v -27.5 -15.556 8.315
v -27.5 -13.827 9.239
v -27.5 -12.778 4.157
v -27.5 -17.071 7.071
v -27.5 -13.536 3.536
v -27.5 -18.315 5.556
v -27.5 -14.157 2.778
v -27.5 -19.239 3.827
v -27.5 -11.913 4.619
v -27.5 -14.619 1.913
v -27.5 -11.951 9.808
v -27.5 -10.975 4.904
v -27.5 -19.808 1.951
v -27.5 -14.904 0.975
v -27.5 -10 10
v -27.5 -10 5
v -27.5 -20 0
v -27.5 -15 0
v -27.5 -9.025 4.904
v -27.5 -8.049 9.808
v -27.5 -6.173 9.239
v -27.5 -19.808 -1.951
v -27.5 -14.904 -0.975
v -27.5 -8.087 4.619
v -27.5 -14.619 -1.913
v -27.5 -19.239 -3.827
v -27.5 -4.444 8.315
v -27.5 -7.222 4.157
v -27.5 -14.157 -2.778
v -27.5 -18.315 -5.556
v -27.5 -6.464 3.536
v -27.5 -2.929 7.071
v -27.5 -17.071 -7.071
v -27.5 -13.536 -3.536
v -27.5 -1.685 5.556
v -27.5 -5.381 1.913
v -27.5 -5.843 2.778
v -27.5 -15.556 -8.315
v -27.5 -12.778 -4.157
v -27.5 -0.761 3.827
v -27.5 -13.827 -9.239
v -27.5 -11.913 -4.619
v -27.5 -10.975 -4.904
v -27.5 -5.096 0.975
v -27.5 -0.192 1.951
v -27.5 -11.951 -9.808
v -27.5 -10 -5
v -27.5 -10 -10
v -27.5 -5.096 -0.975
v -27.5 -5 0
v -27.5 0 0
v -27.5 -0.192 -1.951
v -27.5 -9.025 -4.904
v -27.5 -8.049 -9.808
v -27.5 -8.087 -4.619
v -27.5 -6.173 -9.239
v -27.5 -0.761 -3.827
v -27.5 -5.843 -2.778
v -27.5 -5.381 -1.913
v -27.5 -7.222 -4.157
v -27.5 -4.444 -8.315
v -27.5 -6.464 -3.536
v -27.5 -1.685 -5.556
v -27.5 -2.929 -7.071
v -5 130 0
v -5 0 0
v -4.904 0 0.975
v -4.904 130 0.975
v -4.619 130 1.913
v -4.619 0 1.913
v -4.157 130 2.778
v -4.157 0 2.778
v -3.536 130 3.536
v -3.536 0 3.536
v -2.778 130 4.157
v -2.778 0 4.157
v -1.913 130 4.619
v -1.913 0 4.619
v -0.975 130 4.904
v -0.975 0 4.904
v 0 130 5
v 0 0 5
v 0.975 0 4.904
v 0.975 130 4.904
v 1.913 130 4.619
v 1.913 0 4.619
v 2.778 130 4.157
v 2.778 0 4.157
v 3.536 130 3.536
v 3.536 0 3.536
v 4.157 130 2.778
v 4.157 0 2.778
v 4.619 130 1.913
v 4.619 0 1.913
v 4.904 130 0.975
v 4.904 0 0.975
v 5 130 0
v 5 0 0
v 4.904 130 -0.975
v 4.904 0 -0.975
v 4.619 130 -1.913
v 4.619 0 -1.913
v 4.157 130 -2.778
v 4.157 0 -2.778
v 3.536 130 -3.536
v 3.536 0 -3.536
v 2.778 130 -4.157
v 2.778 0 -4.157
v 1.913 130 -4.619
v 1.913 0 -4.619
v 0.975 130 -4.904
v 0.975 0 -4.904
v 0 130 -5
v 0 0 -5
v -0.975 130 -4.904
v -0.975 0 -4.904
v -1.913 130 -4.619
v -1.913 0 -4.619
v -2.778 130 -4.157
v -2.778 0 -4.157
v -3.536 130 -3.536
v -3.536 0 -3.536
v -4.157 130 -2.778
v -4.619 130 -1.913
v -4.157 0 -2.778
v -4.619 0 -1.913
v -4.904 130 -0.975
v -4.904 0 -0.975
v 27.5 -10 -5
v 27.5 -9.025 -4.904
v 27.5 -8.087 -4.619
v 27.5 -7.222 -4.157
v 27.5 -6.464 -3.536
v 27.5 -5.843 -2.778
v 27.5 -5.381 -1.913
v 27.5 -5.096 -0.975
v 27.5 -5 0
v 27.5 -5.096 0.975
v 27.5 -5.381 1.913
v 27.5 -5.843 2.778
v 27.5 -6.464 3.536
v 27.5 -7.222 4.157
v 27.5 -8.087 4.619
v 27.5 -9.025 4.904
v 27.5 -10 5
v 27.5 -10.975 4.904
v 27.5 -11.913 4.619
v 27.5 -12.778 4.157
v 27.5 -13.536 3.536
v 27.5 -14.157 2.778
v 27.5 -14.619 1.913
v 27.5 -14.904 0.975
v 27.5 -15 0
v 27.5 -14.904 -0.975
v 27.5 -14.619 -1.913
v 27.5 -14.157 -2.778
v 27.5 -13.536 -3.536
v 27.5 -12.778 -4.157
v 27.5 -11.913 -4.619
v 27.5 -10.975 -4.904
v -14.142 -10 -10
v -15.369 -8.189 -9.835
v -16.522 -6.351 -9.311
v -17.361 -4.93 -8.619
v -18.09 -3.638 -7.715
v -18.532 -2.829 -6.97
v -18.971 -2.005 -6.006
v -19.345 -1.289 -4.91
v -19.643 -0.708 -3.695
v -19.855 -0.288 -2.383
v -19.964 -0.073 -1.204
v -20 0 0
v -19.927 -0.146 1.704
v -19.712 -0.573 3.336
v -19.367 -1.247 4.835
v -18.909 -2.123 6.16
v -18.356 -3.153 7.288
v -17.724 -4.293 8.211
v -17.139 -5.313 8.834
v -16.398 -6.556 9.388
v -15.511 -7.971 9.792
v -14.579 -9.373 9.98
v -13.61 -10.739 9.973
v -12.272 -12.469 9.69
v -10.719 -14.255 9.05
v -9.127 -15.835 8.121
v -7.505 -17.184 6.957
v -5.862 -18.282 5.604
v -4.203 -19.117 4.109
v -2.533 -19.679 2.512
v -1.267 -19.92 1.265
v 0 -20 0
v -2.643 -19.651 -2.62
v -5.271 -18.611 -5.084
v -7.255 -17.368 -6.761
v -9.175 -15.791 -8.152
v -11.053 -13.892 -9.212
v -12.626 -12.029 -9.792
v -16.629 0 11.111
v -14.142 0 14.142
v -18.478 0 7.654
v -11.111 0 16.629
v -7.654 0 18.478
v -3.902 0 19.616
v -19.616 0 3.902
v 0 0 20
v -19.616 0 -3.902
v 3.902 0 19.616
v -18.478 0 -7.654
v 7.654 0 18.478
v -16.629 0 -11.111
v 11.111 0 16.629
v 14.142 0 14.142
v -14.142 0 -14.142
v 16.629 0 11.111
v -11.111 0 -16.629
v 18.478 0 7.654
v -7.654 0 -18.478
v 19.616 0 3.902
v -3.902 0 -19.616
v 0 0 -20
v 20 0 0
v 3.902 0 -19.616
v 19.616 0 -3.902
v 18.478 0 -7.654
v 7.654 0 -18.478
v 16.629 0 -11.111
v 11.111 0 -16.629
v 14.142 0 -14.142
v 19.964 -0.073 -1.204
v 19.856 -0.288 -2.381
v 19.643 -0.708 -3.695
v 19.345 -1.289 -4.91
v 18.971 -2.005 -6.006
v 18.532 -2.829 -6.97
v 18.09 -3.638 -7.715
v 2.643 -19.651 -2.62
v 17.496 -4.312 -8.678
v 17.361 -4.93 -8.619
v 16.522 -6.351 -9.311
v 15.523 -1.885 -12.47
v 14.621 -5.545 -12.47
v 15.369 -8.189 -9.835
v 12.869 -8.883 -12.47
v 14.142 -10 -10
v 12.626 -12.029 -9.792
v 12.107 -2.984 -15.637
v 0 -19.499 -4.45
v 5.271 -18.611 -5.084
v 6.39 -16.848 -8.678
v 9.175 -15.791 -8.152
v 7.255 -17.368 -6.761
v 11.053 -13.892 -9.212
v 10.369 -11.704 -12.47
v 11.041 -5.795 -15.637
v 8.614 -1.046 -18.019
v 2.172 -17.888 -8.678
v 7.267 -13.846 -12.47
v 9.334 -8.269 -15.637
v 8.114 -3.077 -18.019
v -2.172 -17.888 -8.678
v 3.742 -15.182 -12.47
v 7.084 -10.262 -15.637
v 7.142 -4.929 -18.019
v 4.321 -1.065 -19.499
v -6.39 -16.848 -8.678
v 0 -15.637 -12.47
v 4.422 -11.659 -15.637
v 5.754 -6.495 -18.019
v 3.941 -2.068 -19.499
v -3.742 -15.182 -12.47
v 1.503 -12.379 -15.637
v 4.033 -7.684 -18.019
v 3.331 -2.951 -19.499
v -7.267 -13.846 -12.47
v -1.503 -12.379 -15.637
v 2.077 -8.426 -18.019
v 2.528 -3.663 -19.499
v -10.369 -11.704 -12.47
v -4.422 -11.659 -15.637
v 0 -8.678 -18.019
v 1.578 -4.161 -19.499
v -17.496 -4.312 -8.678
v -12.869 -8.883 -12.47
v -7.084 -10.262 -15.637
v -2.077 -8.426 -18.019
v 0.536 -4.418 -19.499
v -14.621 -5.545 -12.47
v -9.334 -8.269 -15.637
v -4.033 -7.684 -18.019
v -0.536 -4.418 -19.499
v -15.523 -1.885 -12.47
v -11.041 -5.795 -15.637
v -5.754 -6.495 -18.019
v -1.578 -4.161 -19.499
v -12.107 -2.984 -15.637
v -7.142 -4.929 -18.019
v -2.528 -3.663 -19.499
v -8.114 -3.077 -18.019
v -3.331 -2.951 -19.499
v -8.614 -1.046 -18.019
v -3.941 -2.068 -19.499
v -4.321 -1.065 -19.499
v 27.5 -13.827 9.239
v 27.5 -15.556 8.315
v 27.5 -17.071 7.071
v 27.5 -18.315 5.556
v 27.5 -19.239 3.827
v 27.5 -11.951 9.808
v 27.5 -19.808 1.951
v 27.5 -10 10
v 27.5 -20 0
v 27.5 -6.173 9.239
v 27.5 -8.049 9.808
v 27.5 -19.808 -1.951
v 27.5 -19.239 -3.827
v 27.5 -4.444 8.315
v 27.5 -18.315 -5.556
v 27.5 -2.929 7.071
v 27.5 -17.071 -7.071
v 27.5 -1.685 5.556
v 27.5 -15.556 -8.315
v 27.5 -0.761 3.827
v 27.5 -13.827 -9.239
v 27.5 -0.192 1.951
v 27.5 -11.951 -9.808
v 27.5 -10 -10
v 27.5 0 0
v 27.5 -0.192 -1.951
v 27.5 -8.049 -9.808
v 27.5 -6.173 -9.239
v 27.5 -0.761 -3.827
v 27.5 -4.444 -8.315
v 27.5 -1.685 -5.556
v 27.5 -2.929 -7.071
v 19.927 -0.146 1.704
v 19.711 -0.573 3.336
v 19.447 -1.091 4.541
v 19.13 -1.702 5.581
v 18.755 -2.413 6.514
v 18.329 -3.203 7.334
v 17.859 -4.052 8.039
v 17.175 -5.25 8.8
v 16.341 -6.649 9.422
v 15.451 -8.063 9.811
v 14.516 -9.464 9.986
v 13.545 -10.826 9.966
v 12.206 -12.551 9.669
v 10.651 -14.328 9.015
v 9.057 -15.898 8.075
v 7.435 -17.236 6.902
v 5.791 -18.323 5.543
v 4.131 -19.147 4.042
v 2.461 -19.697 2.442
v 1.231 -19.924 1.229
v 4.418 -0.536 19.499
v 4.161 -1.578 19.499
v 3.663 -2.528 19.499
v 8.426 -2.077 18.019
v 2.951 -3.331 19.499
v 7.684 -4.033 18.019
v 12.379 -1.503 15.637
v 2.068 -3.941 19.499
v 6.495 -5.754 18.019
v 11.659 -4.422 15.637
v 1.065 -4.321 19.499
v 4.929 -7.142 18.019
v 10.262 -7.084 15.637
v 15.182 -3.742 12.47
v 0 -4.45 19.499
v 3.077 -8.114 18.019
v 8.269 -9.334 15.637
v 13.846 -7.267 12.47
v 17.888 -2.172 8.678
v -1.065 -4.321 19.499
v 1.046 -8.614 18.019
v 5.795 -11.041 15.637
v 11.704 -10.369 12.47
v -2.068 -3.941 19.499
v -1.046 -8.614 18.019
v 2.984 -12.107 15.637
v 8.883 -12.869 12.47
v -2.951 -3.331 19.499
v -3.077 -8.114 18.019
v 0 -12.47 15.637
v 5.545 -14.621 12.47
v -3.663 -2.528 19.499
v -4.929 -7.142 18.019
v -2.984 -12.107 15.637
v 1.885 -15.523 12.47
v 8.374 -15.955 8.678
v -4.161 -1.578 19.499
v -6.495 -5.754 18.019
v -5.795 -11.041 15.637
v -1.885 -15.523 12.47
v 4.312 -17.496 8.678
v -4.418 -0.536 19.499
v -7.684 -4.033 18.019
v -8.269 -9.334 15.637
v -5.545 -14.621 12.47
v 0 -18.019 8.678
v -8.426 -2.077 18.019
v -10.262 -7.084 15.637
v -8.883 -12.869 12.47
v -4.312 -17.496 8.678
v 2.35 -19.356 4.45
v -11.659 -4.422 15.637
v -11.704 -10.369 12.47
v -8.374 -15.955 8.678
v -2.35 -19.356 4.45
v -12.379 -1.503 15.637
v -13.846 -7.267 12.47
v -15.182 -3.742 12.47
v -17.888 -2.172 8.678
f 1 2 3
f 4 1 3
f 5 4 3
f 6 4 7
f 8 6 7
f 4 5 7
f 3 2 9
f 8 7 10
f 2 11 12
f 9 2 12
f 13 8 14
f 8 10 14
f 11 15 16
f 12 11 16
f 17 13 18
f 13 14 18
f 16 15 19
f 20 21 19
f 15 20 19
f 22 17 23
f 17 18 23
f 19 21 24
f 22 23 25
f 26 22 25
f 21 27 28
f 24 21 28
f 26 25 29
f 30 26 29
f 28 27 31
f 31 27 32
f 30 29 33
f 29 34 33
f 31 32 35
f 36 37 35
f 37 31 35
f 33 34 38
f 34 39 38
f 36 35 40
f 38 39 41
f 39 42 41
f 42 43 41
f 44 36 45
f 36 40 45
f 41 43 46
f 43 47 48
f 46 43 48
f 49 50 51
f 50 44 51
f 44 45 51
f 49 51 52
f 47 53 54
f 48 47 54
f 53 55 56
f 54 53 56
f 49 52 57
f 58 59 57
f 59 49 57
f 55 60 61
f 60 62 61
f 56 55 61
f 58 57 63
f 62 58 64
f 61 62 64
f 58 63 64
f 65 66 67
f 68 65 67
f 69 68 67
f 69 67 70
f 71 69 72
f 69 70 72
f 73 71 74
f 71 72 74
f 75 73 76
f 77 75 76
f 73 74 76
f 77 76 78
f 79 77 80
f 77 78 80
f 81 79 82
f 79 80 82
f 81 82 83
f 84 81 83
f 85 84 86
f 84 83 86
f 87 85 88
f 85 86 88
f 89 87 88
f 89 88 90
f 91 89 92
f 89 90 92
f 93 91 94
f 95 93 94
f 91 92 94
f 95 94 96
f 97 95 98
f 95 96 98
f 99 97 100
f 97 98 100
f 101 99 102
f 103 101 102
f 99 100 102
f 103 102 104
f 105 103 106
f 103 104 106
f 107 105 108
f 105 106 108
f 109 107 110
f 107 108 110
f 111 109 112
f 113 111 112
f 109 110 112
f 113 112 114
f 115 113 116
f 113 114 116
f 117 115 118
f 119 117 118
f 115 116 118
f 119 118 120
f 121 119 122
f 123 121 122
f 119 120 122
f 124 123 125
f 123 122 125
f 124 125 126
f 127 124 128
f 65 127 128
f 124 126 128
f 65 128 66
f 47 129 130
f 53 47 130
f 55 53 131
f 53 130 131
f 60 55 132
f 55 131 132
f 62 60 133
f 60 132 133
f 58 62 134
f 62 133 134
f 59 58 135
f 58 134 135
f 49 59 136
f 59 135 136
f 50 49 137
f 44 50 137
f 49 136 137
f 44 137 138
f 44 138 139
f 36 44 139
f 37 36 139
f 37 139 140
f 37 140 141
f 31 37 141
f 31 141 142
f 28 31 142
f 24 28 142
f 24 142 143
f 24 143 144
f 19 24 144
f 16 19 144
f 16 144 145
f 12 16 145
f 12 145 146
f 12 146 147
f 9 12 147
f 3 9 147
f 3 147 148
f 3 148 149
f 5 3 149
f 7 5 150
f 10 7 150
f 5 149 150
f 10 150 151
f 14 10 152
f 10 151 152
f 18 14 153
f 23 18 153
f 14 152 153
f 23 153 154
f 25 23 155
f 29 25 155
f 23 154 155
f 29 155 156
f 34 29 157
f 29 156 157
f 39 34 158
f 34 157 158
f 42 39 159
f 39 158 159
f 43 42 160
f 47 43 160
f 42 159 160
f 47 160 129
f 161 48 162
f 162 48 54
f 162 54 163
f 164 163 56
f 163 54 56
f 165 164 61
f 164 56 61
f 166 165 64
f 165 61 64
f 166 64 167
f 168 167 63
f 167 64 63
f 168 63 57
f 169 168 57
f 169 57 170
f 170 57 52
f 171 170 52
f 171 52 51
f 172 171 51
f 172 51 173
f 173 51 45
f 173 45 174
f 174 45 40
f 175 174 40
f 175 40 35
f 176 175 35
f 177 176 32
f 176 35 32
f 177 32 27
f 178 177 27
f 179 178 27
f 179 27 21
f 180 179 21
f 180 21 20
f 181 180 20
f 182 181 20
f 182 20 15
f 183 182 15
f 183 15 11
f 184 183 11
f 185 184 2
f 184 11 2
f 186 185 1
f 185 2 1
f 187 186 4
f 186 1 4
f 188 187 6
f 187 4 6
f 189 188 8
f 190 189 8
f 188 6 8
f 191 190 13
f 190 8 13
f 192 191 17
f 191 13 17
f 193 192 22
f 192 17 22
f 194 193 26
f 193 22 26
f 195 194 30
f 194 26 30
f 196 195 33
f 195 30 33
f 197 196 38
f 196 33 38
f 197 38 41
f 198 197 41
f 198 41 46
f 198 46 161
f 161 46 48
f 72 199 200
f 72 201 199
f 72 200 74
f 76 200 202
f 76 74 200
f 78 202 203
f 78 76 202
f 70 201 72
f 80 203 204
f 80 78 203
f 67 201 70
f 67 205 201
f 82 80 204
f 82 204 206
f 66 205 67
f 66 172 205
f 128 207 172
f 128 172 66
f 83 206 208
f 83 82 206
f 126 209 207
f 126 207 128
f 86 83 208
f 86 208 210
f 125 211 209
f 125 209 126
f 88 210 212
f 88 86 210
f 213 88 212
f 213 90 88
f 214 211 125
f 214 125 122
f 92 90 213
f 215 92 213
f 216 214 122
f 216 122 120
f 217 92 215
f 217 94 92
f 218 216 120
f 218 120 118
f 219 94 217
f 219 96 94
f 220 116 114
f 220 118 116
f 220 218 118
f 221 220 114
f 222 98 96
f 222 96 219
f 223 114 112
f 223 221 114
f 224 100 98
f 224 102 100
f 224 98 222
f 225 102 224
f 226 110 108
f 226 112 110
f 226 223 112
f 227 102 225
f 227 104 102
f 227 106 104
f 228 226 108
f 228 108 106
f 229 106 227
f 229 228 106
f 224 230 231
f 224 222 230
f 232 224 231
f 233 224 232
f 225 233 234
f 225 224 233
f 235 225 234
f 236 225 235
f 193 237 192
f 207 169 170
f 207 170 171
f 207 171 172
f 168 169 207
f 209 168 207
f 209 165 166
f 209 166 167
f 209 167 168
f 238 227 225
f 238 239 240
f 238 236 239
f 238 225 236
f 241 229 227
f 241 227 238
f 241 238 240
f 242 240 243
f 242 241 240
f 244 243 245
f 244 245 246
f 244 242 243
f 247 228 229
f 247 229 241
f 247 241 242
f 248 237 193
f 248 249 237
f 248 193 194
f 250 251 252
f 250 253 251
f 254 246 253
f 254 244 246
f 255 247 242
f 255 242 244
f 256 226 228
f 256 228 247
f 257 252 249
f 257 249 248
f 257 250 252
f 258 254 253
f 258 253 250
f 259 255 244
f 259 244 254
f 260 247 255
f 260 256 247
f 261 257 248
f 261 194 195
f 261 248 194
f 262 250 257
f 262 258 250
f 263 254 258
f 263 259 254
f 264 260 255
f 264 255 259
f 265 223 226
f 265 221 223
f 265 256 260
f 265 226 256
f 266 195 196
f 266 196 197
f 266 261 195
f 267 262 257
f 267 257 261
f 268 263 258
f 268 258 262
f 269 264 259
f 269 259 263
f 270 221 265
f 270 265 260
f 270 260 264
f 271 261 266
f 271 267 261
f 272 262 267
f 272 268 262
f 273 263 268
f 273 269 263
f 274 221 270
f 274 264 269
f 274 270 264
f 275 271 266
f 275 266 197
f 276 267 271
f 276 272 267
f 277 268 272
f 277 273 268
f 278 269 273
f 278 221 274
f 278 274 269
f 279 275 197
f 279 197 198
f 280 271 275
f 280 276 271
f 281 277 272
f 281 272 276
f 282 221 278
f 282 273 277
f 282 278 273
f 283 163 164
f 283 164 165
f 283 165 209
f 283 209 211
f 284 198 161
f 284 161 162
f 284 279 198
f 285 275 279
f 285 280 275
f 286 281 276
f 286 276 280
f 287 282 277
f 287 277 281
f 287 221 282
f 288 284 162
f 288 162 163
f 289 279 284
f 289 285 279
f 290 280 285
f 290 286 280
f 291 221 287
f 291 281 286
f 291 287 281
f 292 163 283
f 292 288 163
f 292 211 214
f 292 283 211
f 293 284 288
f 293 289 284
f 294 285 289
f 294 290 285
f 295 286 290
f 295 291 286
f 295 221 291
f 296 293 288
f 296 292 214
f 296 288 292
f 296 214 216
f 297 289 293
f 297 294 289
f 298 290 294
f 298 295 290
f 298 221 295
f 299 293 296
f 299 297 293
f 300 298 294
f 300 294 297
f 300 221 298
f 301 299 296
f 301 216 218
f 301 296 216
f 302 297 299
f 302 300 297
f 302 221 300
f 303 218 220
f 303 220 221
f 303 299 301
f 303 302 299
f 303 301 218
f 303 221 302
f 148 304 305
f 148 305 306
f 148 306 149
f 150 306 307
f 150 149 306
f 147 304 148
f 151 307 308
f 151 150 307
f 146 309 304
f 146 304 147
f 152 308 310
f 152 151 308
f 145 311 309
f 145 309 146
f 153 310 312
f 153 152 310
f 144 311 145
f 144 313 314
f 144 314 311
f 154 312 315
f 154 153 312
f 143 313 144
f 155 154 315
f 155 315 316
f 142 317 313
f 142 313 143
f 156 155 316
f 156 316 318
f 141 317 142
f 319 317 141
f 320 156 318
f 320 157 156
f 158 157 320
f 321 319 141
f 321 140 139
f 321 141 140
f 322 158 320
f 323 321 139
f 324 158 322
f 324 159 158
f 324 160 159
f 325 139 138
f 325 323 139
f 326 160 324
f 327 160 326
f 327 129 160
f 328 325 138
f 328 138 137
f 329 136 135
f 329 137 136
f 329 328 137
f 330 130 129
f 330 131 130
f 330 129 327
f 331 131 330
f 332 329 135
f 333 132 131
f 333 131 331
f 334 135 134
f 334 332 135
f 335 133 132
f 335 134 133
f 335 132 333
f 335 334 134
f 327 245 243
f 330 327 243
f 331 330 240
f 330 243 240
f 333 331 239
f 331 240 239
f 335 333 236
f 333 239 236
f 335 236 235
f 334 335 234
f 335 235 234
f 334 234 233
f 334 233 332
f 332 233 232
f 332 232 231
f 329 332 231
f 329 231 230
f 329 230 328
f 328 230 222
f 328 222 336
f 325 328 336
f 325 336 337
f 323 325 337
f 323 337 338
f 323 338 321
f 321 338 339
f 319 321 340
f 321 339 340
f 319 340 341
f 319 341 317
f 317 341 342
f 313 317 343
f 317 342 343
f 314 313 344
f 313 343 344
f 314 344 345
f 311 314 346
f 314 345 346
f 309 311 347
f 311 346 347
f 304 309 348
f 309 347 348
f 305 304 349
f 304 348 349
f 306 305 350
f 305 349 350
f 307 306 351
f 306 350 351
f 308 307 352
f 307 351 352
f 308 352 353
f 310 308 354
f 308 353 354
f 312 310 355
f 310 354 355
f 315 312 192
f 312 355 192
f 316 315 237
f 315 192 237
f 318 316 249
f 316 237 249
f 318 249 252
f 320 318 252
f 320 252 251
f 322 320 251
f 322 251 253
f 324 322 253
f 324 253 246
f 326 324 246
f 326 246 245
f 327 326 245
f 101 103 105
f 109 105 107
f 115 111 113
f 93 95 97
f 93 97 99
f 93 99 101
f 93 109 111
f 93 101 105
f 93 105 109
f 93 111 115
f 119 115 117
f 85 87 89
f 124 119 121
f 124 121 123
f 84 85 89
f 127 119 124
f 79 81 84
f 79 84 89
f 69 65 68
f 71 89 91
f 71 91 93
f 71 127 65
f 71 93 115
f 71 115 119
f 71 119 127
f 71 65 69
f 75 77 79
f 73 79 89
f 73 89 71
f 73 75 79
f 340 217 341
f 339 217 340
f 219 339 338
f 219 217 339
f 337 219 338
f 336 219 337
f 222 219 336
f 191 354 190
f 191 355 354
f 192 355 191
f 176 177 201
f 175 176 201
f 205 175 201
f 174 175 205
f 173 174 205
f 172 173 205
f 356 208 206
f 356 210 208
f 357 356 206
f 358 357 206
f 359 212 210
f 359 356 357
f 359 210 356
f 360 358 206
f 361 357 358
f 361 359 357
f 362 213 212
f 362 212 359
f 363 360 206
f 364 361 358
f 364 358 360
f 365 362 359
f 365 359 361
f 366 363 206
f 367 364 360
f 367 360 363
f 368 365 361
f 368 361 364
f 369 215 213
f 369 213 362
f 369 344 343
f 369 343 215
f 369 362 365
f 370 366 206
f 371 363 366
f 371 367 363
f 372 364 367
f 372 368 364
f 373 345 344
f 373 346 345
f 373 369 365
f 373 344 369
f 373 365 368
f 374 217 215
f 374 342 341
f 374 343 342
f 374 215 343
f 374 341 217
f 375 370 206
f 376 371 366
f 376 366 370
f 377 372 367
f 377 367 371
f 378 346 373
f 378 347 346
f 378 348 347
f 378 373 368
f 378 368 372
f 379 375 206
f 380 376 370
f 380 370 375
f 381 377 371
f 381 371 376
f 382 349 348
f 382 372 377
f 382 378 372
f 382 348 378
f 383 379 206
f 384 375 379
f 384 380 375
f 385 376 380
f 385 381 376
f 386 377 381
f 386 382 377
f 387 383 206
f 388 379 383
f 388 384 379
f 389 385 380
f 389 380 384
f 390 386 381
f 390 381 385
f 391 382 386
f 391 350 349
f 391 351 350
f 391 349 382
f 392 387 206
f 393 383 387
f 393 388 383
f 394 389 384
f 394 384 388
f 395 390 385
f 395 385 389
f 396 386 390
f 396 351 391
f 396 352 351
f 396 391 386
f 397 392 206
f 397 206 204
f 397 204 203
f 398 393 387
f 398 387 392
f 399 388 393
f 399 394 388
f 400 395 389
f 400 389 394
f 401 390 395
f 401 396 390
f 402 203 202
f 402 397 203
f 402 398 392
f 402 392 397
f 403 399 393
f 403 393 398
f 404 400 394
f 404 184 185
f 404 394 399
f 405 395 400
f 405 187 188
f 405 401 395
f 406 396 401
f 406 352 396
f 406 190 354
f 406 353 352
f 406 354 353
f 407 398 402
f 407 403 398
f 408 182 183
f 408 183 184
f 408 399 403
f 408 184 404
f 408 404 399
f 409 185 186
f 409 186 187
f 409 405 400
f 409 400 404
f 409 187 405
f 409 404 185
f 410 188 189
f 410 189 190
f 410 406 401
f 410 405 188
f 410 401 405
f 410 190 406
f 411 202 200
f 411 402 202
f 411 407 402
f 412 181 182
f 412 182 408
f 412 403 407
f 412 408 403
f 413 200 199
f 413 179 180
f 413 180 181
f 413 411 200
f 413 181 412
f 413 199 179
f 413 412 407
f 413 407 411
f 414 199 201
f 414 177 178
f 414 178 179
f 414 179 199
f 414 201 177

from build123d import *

# Parameters (mm, degrees)
OBR_T1_ANGLE                     = 180
DODANIE_WYCI_GNI_CIE1_DEPTH      = 27.5
DODANIE_WYCI_GNI_CIE1_DEPTH_BACK = 27.5
SZKIC4_R                         = 10
SZKIC5_R                         = 5
WYTNIJ_WYCI_GNI_CIE1_DEPTH       = 62.846584506
SZKIC6_R                         = 5
DODANIE_WYCI_GNI_CIE2_DEPTH      = 130


with BuildPart() as part:
    # Szkic3 → Obrót1 (revolve)
    with BuildSketch(Plane(origin=(0, 0, 0), x_dir=(1, 0, 0), z_dir=(0, 1, 0))):
        with BuildLine():
            Line((0, 20), (0, -20))
            ThreePointArc((0, -20), (20, 0), (0, 20))
        make_face()
    revolve(axis=Axis((0, 0, -20), (0, 0, -1)), revolution_arc=OBR_T1_ANGLE)

    # Szkic4 → Dodanie-wyciągnięcie1 (add, two sides: drawn at the far end of the back side and taken through both)
    with BuildSketch(Plane(origin=(0, 0, 0), x_dir=(0, 0, -1), z_dir=(1, 0, 0)).offset(-DODANIE_WYCI_GNI_CIE1_DEPTH_BACK)):
        with Locations((0, -10)):
            Circle(SZKIC4_R)
    extrude(amount=DODANIE_WYCI_GNI_CIE1_DEPTH + DODANIE_WYCI_GNI_CIE1_DEPTH_BACK)

    # Szkic5 → Wytnij-wyciągnięcie1 (cut, through all)
    with BuildSketch(Plane(origin=(27.5, 0, 0), x_dir=(0, 0, -1), z_dir=(1, 0, 0))):
        with Locations((0, -10)):
            Circle(SZKIC5_R)
    extrude(amount=-WYTNIJ_WYCI_GNI_CIE1_DEPTH, mode=Mode.SUBTRACT)

    # Szkic6 → Dodanie-wyciągnięcie2 (add)
    with BuildSketch(Plane(origin=(0, 0, 0), x_dir=(1, 0, 0), z_dir=(0, 1, 0))):
        Circle(SZKIC6_R)
    extrude(amount=DODANIE_WYCI_GNI_CIE2_DEPTH)


solid = part.part
